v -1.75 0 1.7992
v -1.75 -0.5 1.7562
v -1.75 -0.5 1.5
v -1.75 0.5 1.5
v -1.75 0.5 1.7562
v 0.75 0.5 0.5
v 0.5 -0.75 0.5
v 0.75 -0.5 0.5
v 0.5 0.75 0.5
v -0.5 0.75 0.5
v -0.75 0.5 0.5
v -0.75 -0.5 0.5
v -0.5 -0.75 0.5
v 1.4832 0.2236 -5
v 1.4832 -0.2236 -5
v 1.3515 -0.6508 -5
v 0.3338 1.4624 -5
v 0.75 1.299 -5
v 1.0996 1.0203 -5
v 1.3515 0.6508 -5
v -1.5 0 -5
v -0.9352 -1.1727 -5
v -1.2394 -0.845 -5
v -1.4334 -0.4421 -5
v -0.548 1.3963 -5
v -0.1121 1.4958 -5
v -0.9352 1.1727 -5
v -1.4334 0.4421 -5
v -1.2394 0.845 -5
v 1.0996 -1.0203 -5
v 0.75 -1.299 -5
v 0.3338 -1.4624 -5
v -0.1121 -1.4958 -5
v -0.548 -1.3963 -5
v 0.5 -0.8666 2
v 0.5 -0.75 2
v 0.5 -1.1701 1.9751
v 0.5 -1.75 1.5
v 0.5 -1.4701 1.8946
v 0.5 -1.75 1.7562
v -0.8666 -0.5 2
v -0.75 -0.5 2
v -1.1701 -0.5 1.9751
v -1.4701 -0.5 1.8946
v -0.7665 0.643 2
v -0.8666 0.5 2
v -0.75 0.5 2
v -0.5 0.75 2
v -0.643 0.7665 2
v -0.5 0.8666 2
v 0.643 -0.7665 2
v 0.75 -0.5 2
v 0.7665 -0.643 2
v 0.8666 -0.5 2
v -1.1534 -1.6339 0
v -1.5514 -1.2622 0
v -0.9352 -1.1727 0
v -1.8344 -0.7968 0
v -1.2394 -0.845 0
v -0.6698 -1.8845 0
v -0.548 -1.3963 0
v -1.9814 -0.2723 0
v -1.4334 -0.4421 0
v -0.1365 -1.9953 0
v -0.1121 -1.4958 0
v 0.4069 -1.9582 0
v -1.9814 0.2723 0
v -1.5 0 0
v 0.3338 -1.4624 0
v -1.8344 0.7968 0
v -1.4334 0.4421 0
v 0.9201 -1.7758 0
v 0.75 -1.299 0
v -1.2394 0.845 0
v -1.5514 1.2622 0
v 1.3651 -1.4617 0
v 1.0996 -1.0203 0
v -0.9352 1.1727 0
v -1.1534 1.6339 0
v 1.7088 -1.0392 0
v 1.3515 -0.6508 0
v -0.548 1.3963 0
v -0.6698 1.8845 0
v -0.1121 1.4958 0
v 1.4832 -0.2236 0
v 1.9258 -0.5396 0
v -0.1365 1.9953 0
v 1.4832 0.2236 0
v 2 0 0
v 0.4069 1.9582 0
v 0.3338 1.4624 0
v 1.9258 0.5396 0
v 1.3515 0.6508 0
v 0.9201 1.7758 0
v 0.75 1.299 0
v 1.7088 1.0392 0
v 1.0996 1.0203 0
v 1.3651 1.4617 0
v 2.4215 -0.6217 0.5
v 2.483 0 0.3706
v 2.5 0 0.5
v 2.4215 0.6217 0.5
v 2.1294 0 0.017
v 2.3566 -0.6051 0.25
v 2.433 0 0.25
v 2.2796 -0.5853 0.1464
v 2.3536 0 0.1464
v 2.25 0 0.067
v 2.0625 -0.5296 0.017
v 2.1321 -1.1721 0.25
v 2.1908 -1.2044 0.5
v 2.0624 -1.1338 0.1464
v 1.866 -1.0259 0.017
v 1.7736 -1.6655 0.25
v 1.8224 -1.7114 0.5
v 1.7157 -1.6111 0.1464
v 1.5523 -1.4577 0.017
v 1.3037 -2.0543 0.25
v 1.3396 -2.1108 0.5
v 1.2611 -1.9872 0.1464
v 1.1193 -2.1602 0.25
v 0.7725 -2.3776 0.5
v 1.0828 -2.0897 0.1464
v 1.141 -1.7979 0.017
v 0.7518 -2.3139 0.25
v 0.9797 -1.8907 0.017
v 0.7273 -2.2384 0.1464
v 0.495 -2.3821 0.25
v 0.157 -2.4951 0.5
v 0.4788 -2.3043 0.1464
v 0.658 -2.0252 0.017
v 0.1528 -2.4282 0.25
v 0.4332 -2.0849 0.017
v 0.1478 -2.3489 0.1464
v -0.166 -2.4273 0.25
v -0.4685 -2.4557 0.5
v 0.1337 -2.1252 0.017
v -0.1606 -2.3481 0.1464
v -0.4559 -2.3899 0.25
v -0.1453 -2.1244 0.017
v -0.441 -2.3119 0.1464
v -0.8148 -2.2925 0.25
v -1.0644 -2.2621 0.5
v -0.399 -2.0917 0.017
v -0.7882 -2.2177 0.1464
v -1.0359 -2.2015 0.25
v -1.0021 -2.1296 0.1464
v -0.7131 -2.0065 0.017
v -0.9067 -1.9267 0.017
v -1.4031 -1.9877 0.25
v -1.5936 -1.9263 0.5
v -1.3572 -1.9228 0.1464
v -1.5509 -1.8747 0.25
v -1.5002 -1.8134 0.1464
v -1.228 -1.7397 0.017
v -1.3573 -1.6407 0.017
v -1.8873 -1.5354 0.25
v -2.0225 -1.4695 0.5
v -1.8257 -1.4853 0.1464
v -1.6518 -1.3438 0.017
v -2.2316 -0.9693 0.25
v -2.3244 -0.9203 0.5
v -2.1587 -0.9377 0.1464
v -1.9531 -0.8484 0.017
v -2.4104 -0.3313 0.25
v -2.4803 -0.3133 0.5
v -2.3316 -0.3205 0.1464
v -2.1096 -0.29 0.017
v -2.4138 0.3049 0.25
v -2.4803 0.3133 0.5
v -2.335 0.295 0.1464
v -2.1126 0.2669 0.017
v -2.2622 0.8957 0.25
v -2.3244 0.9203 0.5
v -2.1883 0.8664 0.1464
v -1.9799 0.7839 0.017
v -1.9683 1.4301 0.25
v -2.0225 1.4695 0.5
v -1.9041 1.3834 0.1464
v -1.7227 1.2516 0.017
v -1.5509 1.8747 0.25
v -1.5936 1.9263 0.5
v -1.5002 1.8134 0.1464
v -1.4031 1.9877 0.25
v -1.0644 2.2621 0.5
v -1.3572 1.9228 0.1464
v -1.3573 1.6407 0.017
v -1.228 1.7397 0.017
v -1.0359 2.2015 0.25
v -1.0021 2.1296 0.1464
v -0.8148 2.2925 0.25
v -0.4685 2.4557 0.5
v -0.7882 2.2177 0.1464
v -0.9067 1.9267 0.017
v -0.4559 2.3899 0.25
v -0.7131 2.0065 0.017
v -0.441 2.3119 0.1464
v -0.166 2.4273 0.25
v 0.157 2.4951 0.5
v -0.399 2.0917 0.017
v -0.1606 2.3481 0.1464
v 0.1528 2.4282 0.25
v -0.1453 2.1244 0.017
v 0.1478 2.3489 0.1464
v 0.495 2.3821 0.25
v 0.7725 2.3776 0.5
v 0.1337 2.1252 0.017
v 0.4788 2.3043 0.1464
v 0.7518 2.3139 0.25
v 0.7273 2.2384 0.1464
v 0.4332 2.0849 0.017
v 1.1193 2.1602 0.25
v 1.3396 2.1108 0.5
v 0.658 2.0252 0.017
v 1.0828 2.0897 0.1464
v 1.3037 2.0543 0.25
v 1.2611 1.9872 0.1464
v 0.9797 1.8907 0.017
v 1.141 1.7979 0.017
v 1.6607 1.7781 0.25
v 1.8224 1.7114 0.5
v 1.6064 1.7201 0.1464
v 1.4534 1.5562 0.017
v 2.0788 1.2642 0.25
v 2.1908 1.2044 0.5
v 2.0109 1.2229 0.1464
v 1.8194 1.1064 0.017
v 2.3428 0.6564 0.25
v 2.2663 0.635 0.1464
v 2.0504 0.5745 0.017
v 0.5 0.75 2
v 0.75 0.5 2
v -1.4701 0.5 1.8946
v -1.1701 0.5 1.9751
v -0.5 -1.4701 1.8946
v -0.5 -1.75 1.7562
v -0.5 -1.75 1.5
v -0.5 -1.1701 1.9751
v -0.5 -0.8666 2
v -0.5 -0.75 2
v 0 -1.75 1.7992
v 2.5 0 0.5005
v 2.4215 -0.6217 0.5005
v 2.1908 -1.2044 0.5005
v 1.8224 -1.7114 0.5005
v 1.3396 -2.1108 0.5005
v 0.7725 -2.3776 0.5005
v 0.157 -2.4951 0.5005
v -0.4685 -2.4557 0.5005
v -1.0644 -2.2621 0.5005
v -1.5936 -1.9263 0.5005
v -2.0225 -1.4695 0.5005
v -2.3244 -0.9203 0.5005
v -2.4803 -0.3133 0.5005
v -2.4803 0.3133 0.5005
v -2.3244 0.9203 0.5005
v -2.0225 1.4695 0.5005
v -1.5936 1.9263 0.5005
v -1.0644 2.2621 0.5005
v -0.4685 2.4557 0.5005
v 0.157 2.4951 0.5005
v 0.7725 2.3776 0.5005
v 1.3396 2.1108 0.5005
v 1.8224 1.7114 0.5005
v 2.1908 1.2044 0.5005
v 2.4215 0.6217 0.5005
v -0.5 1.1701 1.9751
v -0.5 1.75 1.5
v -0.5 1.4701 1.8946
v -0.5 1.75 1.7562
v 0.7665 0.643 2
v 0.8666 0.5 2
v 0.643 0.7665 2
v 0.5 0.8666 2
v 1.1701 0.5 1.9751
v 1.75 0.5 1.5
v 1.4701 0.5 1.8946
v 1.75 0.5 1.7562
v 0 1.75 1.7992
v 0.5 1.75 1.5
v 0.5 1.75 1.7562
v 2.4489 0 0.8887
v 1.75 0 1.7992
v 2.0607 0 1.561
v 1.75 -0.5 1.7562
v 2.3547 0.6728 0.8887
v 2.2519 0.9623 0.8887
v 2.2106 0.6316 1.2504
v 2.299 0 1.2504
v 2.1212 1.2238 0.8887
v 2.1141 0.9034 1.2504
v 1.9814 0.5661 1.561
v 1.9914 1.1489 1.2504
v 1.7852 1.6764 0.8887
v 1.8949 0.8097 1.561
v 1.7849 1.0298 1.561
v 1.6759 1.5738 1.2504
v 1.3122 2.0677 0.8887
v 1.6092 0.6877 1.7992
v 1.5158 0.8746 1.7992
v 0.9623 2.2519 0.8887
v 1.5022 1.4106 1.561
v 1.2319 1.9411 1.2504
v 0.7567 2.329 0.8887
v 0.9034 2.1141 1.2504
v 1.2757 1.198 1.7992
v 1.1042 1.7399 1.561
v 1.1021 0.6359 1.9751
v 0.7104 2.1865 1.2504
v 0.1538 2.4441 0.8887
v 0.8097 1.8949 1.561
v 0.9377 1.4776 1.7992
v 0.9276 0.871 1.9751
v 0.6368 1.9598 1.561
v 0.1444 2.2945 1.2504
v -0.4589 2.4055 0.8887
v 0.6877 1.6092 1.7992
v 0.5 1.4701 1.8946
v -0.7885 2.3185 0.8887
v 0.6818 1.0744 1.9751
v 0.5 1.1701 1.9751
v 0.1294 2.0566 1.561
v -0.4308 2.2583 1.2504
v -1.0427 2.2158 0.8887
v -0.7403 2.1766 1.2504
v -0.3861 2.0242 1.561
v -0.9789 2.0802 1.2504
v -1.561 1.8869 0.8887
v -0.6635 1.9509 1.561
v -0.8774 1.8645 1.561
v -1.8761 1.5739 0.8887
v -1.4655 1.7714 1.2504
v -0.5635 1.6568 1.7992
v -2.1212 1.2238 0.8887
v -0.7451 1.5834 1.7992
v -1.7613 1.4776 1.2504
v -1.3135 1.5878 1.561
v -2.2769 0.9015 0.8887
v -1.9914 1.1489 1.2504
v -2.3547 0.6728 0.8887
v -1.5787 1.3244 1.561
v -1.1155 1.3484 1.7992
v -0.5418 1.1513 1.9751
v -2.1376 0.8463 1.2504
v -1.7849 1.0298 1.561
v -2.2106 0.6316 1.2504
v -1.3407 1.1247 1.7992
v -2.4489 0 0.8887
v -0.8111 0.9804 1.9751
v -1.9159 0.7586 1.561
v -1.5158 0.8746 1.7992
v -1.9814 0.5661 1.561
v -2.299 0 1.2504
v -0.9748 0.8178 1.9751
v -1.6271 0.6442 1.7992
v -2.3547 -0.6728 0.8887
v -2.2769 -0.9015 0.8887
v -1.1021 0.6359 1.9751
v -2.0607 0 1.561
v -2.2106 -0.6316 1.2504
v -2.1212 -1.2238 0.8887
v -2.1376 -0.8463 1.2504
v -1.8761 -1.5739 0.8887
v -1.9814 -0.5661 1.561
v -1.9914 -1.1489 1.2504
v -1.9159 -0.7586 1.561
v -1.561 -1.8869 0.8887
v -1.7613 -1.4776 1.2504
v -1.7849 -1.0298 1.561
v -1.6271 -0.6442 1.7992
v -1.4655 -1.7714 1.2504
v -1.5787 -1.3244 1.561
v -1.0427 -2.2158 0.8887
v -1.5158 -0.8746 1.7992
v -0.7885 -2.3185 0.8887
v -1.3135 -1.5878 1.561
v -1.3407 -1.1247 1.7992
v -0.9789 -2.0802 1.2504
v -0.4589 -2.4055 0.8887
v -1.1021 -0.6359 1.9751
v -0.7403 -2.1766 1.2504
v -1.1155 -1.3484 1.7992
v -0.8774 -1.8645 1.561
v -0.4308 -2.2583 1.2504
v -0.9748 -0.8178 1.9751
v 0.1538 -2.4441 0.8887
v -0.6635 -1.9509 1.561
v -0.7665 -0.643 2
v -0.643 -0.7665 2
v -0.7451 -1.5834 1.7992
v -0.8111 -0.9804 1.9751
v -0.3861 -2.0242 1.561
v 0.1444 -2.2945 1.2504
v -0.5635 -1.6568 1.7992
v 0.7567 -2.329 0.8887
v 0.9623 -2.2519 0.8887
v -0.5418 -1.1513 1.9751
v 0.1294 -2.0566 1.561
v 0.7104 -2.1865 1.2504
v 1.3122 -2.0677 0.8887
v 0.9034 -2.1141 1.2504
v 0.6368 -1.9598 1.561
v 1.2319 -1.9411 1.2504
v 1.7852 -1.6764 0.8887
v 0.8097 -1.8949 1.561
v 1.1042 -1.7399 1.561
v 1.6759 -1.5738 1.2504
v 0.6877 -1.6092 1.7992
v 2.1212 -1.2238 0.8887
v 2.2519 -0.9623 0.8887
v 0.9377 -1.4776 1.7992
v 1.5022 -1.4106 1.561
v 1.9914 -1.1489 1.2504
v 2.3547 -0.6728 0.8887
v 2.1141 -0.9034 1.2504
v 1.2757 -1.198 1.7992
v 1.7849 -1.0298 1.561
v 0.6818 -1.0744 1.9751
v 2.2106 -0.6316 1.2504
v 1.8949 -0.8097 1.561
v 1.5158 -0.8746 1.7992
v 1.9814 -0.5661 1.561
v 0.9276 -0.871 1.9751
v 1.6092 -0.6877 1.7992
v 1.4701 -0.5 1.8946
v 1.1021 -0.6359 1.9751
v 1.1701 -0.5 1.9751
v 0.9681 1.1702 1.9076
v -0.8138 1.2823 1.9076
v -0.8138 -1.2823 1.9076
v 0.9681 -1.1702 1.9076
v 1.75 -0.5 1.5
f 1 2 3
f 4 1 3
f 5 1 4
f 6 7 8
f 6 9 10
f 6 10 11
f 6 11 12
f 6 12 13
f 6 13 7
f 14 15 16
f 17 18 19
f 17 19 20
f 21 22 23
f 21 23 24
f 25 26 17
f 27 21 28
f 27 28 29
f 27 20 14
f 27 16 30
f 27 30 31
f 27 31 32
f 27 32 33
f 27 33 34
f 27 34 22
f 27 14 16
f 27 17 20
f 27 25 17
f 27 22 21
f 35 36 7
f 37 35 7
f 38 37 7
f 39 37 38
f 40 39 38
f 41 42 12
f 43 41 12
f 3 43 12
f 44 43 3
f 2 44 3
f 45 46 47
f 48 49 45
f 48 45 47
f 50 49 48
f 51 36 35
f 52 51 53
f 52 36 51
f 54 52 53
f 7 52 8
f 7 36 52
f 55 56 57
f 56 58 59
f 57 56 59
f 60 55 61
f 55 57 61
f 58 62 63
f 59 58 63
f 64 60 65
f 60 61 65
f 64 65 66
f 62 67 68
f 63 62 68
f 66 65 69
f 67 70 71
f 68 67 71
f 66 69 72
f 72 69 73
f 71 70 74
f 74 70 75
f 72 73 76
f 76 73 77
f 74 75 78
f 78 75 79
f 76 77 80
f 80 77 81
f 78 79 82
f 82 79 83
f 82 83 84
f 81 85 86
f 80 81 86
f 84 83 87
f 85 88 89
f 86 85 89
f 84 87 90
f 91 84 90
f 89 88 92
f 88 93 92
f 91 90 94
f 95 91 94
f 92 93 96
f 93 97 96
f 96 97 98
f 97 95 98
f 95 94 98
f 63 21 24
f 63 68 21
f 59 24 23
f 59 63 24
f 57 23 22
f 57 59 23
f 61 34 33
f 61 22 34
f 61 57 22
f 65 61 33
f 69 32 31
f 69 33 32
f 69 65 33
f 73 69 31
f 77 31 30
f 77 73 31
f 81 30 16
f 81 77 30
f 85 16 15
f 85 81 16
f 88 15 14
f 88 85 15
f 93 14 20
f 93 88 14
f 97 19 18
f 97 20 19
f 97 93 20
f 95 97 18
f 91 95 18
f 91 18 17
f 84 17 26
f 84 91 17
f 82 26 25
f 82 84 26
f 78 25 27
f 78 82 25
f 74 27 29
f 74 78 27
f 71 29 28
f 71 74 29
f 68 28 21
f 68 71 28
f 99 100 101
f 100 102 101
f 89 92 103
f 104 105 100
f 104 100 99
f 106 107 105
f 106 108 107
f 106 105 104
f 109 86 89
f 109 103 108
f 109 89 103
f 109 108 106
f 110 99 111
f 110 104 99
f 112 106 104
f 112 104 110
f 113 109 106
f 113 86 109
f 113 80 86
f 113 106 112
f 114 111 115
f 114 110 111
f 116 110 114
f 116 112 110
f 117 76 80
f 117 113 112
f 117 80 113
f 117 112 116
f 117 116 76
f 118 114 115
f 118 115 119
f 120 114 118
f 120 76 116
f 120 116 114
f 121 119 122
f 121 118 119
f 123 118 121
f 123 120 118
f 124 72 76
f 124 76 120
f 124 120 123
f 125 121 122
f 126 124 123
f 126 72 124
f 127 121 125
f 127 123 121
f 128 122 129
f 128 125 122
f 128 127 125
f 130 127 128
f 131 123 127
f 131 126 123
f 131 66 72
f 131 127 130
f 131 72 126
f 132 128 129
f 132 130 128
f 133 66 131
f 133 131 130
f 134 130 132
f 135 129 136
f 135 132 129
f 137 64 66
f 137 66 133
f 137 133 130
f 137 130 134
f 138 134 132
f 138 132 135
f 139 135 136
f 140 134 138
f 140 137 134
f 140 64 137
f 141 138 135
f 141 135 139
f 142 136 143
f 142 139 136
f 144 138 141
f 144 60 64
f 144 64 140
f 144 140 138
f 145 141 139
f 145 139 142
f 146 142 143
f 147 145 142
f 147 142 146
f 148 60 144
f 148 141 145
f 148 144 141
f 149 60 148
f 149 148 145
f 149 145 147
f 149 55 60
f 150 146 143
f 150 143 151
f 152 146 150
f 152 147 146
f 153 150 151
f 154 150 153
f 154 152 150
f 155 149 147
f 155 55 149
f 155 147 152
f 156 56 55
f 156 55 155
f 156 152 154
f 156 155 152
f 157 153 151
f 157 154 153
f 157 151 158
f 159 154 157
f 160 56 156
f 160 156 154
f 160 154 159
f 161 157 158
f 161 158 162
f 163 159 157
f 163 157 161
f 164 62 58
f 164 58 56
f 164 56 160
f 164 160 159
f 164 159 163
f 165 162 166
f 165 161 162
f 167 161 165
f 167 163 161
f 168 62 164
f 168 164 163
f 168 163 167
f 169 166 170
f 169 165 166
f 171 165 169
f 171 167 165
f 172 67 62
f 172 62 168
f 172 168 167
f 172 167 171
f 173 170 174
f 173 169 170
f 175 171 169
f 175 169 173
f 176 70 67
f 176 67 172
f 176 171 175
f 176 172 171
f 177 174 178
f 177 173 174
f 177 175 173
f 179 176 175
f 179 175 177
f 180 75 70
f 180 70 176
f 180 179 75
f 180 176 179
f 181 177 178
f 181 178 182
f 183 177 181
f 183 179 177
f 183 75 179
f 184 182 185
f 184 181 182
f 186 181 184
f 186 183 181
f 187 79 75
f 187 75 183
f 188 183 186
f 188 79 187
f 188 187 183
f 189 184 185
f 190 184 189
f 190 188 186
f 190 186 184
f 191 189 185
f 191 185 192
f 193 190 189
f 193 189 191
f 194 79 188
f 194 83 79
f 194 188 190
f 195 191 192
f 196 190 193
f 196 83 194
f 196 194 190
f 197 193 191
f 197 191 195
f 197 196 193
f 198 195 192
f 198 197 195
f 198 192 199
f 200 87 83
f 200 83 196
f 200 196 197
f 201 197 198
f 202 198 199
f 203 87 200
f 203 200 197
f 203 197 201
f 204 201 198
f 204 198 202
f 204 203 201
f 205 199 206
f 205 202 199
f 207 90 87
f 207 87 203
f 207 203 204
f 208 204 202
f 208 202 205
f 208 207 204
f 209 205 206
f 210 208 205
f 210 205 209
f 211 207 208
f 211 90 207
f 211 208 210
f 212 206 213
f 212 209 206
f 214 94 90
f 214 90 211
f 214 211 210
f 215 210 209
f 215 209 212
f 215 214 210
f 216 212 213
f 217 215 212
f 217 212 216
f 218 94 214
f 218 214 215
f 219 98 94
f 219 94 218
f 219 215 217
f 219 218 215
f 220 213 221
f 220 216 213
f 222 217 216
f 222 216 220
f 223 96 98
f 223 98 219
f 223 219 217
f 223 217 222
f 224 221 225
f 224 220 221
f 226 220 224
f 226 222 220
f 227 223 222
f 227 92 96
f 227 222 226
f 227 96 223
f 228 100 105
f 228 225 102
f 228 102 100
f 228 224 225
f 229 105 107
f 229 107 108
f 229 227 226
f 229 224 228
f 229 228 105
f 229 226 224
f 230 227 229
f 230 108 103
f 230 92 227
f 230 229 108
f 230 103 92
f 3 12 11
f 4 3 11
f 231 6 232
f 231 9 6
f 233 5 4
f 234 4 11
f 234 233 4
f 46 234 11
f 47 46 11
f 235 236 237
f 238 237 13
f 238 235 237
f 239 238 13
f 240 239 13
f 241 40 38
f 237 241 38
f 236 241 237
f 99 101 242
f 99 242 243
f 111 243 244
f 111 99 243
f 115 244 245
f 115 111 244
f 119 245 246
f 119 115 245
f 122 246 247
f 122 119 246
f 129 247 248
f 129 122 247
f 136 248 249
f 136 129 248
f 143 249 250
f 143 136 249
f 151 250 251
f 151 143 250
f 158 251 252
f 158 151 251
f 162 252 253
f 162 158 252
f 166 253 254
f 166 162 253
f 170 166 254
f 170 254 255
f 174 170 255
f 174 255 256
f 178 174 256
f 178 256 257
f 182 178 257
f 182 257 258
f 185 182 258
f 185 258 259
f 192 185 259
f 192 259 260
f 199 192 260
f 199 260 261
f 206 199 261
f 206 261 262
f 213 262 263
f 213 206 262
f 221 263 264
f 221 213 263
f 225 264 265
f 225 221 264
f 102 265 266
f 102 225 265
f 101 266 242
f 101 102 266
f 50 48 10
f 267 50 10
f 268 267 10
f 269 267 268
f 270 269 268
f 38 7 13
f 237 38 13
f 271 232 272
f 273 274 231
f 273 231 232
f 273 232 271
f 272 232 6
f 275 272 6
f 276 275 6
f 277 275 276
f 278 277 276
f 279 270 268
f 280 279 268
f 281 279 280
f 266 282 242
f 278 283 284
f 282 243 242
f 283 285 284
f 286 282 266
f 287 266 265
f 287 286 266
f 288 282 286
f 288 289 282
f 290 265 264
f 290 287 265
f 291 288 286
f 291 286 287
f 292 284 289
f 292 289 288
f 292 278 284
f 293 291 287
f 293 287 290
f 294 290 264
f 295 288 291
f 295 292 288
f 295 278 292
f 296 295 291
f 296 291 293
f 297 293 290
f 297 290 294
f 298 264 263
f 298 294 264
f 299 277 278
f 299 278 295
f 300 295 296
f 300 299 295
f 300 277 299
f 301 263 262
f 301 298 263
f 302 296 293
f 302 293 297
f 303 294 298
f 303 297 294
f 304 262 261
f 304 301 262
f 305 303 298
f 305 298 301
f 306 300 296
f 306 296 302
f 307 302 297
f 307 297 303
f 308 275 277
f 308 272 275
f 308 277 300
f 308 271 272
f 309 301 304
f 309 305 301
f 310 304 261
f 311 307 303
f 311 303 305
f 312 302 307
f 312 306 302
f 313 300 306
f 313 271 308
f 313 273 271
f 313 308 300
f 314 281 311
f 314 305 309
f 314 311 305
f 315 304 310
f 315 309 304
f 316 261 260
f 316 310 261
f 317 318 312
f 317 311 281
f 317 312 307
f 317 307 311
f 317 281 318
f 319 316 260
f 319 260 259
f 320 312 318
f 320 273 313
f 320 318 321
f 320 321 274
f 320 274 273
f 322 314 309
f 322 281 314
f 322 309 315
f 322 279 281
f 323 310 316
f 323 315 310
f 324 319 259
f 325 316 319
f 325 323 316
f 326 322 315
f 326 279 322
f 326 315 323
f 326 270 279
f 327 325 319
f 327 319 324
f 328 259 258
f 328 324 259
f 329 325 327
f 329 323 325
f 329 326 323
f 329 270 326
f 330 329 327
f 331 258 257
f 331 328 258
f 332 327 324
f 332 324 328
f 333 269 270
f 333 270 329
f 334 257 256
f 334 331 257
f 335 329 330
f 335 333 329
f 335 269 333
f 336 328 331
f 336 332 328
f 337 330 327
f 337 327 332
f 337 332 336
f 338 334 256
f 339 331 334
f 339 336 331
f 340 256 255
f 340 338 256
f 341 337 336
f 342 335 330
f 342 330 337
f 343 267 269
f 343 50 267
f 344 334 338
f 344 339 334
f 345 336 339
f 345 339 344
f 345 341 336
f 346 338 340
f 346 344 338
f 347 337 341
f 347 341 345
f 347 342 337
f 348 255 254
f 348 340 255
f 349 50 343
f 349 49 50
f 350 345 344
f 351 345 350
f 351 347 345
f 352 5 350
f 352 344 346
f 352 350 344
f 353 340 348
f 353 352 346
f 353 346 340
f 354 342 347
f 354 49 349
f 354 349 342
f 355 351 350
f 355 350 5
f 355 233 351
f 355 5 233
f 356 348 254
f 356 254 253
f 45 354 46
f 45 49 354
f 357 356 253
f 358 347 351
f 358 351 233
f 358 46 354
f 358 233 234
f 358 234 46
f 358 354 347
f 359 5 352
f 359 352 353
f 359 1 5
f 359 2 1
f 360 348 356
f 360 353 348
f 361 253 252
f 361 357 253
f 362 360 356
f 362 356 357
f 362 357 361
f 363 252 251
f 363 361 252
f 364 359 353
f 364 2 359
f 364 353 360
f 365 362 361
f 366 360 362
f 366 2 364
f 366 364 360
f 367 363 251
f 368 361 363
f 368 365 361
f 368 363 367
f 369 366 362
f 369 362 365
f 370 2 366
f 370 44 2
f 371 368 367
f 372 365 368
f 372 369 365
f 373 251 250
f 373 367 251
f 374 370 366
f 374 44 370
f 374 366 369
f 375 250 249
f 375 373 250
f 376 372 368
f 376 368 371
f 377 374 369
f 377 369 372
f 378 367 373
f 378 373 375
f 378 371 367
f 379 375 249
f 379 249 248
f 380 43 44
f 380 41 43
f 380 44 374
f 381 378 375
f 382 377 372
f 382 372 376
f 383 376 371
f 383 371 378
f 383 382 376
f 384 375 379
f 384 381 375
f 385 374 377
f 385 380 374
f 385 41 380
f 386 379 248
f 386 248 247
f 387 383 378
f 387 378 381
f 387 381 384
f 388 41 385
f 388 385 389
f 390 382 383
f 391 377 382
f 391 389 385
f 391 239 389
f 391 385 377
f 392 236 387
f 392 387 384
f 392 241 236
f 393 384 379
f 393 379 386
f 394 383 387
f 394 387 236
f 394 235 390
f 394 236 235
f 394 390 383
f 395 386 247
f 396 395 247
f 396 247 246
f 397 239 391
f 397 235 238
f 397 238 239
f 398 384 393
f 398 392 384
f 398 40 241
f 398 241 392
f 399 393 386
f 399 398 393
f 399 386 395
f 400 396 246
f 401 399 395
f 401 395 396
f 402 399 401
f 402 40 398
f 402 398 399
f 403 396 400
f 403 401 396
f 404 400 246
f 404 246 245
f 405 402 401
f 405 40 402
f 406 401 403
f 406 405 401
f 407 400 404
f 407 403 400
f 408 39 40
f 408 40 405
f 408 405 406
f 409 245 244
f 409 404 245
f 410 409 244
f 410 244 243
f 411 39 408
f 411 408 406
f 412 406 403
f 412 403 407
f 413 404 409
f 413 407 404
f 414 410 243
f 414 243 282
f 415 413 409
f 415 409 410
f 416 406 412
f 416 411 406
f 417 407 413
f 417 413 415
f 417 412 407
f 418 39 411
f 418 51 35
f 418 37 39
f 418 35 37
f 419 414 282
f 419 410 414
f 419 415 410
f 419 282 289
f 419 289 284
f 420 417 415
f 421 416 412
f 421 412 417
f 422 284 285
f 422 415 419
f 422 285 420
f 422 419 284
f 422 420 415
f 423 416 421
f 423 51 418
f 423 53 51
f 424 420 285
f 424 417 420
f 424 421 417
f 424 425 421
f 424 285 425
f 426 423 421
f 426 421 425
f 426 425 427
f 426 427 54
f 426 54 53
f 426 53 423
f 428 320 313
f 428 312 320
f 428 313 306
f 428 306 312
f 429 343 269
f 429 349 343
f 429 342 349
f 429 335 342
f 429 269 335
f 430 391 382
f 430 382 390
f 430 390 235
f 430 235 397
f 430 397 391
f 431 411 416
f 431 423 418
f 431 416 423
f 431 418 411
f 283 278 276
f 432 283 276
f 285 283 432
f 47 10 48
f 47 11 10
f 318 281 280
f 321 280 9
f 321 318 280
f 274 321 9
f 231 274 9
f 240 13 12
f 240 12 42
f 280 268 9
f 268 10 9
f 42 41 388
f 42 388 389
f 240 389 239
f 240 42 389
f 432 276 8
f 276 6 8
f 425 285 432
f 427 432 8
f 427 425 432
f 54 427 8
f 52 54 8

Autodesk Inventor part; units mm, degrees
ref_plane "YZ Plane" through (0, 0, 0) normal (1, 0, 0) x (0, 1, 0)
ref_plane "XZ Plane" through (0, 0, 0) normal (0, 1, 0) x (-1, 0, 0)
ref_plane "XY Plane" through (0, 0, 0) normal (0, 0, 1) x (1, 0, 0)
sketch "Sketch1" plane through (0, 0, 0) normal (0, 0, 1) x (1, 0, 0)
  circle A0 centre (0, 0) radius 2.5
  dimension "d0" = 5
extrude "Extrusion1" add sketch "Sketch1" along normal blind 2
fillet "Fillet1" radius 0.5 1 edges at (-2.5, 0, 0)
fillet "Fillet2" radius 1.5 1 edges at (-2.5, 0, 2)
sketch "Sketch2" plane through (0, 0, 2) normal (0, 0, 1) x (1, 0, 0)
  circle A0 centre (0, 0) radius 1 projected
  line L0 (1.75, 0.5) -> (1.75, -0.5)
  line L1 (-1.75, -0.5) -> (-1.75, 0.5)
  line L2 (-0.5, 1.75) -> (0.5, 1.75)
  line L3 (0.5, -1.75) -> (-0.5, -1.75)
  line L4 (-0.5, -1.75) -> (-0.5, -0.5)
  line L5 (-0.5, 0.5) -> (-0.5, 1.75)
  line L6 (-1.75, 0.5) -> (-0.5, 0.5)
  line L7 (0.5, 0.5) -> (1.75, 0.5)
  line L8 (0.5, 1.75) -> (0.5, 0.5)
  line L9 (0.5, -0.5) -> (0.5, -1.75)
  line L10 (1.75, -0.5) -> (0.5, -0.5)
  line L11 (-0.5, -0.5) -> (-1.75, -0.5)
  dimension "d5" = 1
  dimension "d6" = 3.5
  dimension "d7" = 1.75
  dimension "d9" = 1
  dimension "d10" = 3.5
  dimension "d11" = 1.75
extrude "Extrusion2" cut sketch "Sketch2" against normal blind 1.5 contours A0 L10 L9 L4 L11 L6 L5 L8 L7 | A0 L7 L0 L10 | A0 L5 L2 L8 | L9 L3 L4 A0 | A0 L11 L1 L6
chamfer "Chamfer1" distance 1 angle 45 4 edges at (-1.75, 0, 0.5) (0, 1.75, 0.5) (1.75, 0, 0.5) (0, -1.75, 0.5)
chamfer "Chamfer2" distance 0.25 angle 45 4 edges at (-0.5, 0.5, 1.25) (-0.5, -0.5, 1.25) (0.5, 0.5, 1.25) (0.5, -0.5, 1.25)
sketch "Sketch3" plane through (0, 0, 0) normal (0, 0, -1) x (-1, 0, 0)
  circle A0 centre (0, 0) radius 2 projected
  circle A1 centre (0, 0) radius 1.5
  dimension "d19" = 3
extrude "Extrusion3" add sketch "Sketch3" along normal blind 5 contours A1
thread "Thread1" size "M3x0.5" class "6g" standard "ANSI Metric M Profile" full length
properties part number "screw_M3_5"
